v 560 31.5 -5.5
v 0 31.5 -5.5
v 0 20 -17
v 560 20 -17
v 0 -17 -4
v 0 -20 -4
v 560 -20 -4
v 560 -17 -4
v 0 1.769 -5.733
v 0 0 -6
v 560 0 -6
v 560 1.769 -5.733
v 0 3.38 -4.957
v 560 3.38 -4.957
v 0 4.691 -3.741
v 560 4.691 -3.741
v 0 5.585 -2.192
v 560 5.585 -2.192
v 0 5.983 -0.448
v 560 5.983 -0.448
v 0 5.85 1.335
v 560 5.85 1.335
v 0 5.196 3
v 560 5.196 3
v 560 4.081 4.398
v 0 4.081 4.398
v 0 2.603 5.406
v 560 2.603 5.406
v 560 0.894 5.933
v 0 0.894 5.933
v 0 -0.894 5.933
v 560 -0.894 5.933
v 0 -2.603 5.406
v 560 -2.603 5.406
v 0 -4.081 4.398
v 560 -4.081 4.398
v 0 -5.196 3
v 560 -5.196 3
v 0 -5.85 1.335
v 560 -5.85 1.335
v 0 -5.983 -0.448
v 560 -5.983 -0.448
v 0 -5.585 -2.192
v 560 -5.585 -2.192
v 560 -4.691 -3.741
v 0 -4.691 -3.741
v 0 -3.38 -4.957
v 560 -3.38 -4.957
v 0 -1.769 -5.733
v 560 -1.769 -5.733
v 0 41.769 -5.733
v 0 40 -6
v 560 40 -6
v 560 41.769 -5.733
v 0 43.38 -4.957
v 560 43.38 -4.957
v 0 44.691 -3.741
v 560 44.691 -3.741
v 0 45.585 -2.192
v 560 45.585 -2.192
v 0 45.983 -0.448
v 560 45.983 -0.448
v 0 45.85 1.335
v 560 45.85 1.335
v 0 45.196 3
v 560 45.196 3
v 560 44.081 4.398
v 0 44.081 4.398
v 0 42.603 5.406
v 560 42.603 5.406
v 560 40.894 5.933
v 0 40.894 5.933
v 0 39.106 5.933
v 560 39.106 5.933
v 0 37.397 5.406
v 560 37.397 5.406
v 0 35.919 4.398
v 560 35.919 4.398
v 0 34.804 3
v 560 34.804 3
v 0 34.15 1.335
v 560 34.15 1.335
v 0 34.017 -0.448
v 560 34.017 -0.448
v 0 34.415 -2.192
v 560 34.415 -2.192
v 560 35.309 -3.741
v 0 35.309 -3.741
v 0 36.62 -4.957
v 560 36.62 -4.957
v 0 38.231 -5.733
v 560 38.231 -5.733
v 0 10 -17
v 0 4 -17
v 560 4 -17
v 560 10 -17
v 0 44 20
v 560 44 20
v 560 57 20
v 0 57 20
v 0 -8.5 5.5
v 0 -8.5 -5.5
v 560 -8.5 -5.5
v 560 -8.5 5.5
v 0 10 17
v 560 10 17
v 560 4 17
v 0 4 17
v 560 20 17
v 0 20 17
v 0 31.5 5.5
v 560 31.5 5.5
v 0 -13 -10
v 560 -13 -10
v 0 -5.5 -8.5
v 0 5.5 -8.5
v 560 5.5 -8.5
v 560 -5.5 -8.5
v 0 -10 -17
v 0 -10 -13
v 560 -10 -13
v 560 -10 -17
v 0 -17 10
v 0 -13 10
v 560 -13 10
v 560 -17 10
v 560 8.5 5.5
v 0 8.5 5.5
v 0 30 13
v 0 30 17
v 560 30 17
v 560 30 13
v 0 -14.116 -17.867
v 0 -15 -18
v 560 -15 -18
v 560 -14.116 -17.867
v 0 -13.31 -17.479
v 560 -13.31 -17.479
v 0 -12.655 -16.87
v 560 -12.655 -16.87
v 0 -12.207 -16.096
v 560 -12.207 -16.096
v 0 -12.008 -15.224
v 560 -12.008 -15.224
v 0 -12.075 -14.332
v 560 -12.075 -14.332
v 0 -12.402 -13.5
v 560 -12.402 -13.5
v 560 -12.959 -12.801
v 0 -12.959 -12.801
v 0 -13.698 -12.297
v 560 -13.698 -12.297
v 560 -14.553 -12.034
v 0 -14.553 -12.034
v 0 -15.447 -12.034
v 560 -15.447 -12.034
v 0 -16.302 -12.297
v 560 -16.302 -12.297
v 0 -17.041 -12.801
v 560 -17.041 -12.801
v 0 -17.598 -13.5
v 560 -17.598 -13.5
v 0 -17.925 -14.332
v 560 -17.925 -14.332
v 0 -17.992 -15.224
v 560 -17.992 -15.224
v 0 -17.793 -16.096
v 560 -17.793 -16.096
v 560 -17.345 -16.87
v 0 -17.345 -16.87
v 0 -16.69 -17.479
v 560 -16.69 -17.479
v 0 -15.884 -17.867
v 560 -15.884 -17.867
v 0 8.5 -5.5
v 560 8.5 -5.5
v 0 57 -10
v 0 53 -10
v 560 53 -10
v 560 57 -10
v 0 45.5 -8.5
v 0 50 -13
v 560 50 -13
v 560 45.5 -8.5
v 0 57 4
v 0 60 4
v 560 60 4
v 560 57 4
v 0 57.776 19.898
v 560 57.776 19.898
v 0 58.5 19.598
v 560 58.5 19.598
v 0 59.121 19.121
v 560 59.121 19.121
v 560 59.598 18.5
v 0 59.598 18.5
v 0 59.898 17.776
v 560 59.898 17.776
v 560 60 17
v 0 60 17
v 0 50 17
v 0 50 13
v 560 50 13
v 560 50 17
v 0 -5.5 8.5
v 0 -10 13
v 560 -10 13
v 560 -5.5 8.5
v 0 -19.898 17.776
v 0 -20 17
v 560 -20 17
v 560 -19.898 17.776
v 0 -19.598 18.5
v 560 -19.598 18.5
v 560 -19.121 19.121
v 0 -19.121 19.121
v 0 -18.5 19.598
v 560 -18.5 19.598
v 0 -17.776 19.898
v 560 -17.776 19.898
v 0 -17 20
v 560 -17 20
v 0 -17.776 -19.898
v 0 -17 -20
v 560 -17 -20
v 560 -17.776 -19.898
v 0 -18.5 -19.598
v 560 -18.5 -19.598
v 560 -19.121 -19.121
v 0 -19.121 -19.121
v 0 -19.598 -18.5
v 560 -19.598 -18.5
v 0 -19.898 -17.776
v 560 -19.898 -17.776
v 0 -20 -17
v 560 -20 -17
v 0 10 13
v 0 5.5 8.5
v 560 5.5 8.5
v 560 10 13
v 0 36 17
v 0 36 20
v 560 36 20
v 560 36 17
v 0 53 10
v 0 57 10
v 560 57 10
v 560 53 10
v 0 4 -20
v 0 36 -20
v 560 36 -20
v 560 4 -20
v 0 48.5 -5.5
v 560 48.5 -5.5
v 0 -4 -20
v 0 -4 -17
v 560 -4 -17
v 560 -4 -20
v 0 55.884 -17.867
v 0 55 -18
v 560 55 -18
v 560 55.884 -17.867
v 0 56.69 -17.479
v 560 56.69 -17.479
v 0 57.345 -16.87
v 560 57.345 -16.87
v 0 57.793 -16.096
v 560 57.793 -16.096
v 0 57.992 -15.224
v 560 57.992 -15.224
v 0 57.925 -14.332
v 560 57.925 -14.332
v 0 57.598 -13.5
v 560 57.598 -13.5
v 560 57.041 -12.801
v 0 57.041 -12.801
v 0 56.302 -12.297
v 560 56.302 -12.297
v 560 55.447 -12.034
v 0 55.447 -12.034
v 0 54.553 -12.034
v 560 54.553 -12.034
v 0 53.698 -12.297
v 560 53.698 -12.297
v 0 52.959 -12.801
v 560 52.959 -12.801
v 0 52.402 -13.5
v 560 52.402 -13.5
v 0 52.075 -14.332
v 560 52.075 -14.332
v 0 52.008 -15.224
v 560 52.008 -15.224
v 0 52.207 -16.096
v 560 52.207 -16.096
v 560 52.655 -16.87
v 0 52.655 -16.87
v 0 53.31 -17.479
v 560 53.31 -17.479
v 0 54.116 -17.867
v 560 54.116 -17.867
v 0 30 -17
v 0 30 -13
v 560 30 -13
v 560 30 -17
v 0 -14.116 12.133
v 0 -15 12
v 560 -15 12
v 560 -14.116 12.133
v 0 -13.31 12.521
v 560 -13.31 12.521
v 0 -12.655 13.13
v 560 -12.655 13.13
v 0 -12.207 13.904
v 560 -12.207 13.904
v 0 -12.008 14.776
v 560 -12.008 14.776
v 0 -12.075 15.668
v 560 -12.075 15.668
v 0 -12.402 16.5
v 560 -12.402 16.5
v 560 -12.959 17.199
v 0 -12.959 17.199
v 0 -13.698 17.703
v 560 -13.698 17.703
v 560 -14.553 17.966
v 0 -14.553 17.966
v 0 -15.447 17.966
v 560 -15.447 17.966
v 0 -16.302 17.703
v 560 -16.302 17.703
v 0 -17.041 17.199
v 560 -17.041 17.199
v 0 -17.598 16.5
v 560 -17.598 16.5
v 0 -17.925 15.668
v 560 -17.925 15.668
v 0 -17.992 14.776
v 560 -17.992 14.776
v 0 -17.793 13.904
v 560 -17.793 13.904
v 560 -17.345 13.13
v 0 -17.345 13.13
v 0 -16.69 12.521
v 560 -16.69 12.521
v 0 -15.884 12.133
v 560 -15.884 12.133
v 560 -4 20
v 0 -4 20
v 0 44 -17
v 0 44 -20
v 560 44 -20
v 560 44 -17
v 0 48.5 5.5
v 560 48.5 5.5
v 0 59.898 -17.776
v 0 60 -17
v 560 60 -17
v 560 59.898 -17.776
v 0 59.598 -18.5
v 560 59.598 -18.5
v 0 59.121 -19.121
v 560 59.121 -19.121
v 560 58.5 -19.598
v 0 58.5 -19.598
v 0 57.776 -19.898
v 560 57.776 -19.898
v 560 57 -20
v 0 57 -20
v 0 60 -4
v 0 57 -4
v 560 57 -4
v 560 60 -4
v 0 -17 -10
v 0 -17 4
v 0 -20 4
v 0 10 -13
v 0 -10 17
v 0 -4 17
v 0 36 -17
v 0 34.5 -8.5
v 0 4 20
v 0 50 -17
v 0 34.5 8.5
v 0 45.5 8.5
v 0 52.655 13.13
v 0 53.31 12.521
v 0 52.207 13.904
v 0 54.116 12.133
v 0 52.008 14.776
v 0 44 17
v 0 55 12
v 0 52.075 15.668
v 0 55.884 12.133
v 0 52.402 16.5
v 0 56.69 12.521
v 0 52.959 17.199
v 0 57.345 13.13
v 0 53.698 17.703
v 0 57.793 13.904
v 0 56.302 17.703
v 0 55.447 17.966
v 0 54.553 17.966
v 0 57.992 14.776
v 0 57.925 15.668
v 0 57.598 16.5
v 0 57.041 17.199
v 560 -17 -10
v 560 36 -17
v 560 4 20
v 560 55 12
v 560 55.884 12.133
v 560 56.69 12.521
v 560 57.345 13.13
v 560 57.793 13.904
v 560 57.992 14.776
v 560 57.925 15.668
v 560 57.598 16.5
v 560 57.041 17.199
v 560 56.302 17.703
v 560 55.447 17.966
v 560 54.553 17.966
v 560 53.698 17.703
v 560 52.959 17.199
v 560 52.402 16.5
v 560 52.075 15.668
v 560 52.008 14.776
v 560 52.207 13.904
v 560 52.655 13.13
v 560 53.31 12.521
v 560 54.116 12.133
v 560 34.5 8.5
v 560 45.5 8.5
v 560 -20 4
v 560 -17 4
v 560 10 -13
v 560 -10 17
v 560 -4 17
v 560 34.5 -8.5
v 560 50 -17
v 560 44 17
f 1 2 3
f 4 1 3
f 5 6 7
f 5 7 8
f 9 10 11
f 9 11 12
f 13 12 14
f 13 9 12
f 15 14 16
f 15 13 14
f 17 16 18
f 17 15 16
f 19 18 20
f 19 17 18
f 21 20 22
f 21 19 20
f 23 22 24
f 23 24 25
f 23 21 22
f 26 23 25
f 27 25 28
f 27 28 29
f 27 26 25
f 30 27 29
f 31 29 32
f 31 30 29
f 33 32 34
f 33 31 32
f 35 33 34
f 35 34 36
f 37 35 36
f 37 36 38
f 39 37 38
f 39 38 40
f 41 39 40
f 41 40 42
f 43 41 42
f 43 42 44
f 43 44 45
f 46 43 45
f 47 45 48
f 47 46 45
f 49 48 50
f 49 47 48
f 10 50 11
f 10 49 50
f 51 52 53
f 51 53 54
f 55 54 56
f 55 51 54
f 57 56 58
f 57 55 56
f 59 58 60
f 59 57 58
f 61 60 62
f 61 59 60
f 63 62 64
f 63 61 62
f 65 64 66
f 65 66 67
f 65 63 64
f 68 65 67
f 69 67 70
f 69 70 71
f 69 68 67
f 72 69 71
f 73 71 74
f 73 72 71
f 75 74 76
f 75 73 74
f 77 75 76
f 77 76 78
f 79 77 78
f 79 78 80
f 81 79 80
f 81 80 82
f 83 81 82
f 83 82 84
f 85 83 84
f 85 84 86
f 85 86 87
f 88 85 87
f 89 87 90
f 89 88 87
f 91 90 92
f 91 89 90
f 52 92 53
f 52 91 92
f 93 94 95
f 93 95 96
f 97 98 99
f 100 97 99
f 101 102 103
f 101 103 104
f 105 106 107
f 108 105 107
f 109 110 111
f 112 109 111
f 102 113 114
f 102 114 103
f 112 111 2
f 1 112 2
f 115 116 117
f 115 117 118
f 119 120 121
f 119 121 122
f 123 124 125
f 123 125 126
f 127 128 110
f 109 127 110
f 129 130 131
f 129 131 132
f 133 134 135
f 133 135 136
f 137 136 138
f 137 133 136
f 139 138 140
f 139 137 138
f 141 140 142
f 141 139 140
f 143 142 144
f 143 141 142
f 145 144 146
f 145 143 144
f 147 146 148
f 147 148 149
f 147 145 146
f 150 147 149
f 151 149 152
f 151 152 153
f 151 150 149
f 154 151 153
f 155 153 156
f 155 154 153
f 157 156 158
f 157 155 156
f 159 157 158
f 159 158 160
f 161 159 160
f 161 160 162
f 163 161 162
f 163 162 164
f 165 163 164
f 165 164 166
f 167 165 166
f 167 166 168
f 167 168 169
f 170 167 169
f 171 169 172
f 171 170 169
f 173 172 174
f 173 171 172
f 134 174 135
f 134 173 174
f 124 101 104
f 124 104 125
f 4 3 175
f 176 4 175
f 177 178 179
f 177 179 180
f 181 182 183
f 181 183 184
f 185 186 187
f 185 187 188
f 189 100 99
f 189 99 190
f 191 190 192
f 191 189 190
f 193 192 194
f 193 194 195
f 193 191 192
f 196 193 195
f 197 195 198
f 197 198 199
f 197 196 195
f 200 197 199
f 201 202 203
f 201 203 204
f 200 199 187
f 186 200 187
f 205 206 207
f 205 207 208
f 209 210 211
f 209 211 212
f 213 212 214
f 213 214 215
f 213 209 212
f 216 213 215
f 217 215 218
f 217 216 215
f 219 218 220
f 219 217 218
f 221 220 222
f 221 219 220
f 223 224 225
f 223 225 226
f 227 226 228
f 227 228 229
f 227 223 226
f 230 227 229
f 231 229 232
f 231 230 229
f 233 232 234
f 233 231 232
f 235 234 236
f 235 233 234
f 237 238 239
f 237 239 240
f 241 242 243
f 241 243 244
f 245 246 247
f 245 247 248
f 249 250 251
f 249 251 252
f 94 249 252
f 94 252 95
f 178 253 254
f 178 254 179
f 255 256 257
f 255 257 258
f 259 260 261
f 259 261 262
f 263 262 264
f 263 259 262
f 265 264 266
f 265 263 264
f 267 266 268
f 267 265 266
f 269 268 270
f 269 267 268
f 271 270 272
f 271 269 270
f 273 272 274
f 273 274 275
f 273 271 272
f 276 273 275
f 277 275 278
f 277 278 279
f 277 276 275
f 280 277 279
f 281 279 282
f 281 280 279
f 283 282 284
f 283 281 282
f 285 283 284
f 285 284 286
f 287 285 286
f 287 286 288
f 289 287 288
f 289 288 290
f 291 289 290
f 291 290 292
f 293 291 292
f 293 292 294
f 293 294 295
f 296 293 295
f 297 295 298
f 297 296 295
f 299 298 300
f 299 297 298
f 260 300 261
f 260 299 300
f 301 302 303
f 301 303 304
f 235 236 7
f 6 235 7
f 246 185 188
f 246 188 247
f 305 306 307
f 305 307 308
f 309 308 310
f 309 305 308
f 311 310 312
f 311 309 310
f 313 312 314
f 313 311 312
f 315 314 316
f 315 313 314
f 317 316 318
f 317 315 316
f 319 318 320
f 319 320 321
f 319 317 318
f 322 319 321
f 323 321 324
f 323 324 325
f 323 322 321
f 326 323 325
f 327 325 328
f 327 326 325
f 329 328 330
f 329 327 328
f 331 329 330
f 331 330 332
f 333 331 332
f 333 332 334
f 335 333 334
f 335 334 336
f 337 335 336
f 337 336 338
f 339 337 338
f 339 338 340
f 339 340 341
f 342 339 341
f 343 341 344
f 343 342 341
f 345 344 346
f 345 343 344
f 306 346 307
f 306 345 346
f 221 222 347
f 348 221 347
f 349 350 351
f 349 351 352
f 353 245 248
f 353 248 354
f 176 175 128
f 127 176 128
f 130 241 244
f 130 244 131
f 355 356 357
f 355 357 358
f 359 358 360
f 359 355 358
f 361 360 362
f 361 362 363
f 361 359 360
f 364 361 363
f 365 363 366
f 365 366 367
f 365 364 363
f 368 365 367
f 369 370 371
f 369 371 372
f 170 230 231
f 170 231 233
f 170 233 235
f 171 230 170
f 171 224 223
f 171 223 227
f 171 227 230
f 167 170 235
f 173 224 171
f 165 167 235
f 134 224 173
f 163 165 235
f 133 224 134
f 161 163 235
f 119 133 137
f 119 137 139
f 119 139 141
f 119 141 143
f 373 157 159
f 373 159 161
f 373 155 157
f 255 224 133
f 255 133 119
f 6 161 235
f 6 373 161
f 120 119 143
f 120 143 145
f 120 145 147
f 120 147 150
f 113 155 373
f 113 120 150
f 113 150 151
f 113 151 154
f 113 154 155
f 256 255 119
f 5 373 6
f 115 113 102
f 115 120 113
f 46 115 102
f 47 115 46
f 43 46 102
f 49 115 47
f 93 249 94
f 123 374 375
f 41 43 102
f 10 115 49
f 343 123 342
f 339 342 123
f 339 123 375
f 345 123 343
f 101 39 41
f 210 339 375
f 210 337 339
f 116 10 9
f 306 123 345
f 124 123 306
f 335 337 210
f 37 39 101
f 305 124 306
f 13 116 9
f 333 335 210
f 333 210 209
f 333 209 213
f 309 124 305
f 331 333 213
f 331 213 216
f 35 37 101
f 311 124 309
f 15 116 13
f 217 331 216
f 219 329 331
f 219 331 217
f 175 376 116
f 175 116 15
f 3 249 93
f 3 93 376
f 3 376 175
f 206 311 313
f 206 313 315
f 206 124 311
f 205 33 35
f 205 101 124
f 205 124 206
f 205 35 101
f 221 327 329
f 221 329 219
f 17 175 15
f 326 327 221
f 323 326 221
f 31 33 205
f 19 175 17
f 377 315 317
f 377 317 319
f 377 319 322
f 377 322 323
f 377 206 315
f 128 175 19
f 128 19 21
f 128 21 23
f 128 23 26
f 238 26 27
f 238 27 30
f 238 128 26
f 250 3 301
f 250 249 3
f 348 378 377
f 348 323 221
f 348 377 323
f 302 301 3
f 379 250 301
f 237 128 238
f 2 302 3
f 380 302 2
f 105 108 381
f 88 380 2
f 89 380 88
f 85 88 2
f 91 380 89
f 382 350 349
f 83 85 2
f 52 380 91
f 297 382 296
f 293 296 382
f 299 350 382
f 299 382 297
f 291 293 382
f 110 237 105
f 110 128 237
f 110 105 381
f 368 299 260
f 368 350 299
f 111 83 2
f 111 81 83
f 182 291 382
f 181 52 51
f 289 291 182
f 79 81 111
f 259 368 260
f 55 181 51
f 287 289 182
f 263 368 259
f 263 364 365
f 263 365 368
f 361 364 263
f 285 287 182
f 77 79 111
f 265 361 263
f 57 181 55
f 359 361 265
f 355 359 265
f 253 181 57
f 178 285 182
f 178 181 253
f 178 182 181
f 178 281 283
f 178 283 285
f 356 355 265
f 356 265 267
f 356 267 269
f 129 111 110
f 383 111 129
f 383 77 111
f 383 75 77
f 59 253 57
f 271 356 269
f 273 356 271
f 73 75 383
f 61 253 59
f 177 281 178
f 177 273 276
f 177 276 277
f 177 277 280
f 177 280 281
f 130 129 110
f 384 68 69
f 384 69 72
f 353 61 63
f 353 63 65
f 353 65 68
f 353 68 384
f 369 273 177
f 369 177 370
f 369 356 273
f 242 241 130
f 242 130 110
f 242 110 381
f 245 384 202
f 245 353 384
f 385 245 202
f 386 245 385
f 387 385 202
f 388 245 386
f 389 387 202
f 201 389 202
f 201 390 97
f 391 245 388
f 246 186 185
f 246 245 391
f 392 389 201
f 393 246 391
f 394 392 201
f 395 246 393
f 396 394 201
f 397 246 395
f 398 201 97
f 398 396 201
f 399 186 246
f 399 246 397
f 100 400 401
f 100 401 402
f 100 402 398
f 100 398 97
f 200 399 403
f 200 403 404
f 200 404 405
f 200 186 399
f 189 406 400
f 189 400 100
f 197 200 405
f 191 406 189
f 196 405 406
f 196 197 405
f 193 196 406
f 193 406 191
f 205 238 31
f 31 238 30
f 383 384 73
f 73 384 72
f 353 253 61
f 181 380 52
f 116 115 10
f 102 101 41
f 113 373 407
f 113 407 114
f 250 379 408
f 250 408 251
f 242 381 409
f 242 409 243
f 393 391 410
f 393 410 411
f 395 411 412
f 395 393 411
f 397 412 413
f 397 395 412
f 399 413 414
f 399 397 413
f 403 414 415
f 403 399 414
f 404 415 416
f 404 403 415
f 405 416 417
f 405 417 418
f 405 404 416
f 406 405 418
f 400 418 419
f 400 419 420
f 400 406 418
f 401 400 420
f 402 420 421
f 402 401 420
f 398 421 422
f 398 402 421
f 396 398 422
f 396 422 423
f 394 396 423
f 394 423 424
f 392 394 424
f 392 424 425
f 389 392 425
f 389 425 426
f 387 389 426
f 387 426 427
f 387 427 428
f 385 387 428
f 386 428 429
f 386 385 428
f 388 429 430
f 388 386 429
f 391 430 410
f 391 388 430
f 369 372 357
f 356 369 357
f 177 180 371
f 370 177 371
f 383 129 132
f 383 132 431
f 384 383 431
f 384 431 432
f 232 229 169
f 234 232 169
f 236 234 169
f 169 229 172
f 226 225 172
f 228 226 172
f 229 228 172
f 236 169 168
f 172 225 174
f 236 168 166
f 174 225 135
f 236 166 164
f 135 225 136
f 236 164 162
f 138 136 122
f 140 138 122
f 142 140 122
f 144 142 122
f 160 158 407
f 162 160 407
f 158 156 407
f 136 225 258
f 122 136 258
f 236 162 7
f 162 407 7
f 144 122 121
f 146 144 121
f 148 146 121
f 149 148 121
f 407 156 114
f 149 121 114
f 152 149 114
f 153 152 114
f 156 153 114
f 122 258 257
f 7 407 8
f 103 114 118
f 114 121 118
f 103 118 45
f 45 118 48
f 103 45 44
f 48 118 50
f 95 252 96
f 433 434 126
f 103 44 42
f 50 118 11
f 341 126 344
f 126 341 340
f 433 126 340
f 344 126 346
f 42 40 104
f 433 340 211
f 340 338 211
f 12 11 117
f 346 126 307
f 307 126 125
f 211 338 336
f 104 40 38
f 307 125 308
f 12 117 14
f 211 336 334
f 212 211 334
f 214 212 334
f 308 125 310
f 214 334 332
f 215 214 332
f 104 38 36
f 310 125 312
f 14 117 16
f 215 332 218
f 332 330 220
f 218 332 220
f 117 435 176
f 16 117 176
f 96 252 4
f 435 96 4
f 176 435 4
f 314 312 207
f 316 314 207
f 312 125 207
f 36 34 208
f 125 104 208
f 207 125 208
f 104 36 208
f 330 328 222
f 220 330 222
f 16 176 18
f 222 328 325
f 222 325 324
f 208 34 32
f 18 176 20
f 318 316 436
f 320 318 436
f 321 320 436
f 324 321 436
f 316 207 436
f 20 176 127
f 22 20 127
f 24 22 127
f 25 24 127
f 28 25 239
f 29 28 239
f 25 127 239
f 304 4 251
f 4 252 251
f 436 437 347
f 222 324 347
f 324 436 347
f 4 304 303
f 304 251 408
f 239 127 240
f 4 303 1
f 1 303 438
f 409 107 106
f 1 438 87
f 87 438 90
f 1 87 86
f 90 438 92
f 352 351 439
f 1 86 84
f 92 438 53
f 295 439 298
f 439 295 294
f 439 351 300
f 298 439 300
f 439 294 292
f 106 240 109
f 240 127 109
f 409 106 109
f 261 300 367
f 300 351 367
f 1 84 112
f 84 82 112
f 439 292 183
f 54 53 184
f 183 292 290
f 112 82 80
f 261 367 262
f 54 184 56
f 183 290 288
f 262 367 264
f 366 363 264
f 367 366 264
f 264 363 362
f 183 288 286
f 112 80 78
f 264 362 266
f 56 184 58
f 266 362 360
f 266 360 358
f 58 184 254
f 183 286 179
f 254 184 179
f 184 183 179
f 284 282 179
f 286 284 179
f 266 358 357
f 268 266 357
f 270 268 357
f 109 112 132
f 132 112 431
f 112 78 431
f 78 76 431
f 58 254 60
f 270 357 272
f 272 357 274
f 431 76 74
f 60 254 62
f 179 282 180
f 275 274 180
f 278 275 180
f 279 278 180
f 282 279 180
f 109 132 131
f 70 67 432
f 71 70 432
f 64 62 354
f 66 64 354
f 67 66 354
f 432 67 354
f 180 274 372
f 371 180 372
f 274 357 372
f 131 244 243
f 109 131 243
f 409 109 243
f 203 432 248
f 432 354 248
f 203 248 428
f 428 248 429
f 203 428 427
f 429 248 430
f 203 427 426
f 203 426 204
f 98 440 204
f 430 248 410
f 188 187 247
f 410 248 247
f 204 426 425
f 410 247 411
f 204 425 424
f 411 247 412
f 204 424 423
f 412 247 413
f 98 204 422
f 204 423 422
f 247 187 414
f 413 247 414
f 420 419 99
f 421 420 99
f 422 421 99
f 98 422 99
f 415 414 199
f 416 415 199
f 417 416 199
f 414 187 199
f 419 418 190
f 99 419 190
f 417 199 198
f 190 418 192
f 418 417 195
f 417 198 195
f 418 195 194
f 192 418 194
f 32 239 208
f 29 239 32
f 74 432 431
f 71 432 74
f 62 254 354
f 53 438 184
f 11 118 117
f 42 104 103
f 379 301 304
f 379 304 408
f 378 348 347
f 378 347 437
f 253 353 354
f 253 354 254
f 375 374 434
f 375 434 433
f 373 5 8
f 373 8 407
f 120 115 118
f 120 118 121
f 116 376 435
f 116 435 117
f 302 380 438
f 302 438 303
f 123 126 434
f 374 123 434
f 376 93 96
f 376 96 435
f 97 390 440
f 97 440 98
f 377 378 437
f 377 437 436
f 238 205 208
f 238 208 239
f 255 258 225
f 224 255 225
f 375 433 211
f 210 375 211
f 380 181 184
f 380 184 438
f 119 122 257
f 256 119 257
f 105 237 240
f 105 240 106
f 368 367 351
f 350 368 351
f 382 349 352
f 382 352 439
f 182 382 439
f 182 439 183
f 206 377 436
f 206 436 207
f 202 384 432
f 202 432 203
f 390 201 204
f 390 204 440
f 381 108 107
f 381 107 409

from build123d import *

# Parameters (mm, degrees)
SKETCH1_R           = 6
SKETCH1_R_2         = 3
BOSS_EXTRUDE1_DEPTH = 560


with BuildPart() as part:
    # Sketch1 → Boss-Extrude1 (new body)
    with BuildSketch(Plane(origin=(0, 0, 0), x_dir=(0, 0, -1), z_dir=(1, 0, 0))):
        with BuildLine():
            Line((-20, -4), (-17, -4))
            Line((-17, -4), (-17, -10))
            Line((-17, -10), (-13, -10))
            Line((-13, -10), (-8.5, -5.5))
            Line((-8.5, -5.5), (-8.5, 5.5))
            Line((-8.5, 5.5), (-13, 10))
            Line((-13, 10), (-17, 10))
            Line((-17, 10), (-17, 4))
            Line((-17, 4), (-20, 4))
            Line((-20, 4), (-20, 36))
            Line((-20, 36), (-17, 36))
            Line((-17, 36), (-17, 30))
            Line((-17, 30), (-13, 30))
            Line((-13, 30), (-8.5, 34.5))
            Line((-8.5, 34.5), (-8.5, 45.5))
            Line((-8.5, 45.5), (-13, 50))
            Line((-13, 50), (-17, 50))
            Line((-17, 50), (-17, 44))
            Line((-17, 44), (-20, 44))
            Line((-20, 44), (-20, 57))
            ThreePointArc((-20, 57), (-19.121320344, 59.121320344), (-17, 60))
            Line((-17, 60), (-4, 60))
            Line((-4, 60), (-4, 57))
            Line((-4, 57), (-10, 57))
            Line((-10, 57), (-10, 53))
            Line((-10, 53), (-5.5, 48.5))
            Line((-5.5, 48.5), (5.5, 48.5))
            Line((5.5, 48.5), (10, 53))
            Line((10, 53), (10, 57))
            Line((10, 57), (4, 57))
            Line((4, 57), (4, 60))
            Line((4, 60), (17, 60))
            ThreePointArc((17, 60), (19.121320344, 59.121320344), (20, 57))
            Line((20, 57), (20, 44))
            Line((20, 44), (17, 44))
            Line((17, 44), (17, 50))
            Line((17, 50), (13, 50))
            Line((13, 50), (8.5, 45.5))
            Line((8.5, 45.5), (8.5, 34.5))
            Line((8.5, 34.5), (13, 30))
            Line((13, 30), (17, 30))
            Line((17, 30), (17, 36))
            Line((17, 36), (20, 36))
            Line((20, 36), (20, 20))
            Line((20, 20), (20, 4))
            Line((20, 4), (17, 4))
            Line((17, 4), (17, 10))
            Line((17, 10), (13, 10))
            Line((13, 10), (8.5, 5.5))
            Line((8.5, 5.5), (8.5, -5.5))
            Line((8.5, -5.5), (13, -10))
            Line((13, -10), (17, -10))
            Line((17, -10), (17, -4))
            Line((17, -4), (20, -4))
            Line((20, -4), (20, -17))
            ThreePointArc((20, -17), (19.121320344, -19.121320344), (17, -20))
            Line((17, -20), (4, -20))
            Line((4, -20), (4, -17))
            Line((4, -17), (10, -17))
            Line((10, -17), (10, -13))
            Line((10, -13), (5.5, -8.5))
            Line((5.5, -8.5), (-5.5, -8.5))
            Line((-5.5, -8.5), (-10, -13))
            Line((-10, -13), (-10, -17))
            Line((-10, -17), (-4, -17))
            Line((-4, -17), (-4, -20))
            Line((-4, -20), (-17, -20))
            ThreePointArc((-17, -20), (-19.121320344, -19.121320344), (-20, -17))
            Line((-20, -17), (-20, -4))
        make_face()
        Circle(SKETCH1_R, mode=Mode.SUBTRACT)
        with Locations((-15, -15)):
            Circle(SKETCH1_R_2, mode=Mode.SUBTRACT)
        with Locations((15, 55)):
            Circle(SKETCH1_R_2, mode=Mode.SUBTRACT)
        with Locations((-15, 55)):
            Circle(SKETCH1_R_2, mode=Mode.SUBTRACT)
        with Locations((15, -15)):
            Circle(SKETCH1_R_2, mode=Mode.SUBTRACT)
        with Locations((0, 40)):
            Circle(SKETCH1_R, mode=Mode.SUBTRACT)
        Polygon((-5.5, 8.5), (-17, 20), (-5.5, 31.5), (5.5, 31.5), (17, 20), (5.5, 8.5), align=None, mode=Mode.SUBTRACT)
    extrude(amount=BOSS_EXTRUDE1_DEPTH)


solid = part.part
